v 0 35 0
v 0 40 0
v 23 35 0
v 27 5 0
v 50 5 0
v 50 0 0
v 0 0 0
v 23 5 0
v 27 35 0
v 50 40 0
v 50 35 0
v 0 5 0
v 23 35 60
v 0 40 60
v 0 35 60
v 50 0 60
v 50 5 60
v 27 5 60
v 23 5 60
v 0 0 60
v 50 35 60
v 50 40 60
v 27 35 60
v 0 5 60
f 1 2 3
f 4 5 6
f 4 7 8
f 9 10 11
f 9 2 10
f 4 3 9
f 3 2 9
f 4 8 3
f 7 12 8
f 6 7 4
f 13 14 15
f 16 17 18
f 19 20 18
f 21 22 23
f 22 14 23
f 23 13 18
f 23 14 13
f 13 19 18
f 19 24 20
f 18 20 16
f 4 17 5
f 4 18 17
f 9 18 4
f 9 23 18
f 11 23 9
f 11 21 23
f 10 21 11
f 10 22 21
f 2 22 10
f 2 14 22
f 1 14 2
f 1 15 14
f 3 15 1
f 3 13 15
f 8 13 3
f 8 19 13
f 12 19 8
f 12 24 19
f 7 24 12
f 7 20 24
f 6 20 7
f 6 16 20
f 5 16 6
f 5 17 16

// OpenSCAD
$fn = 32;

// ----------------------------------------------------------------------
// Structural section: ibeam 50 x 40 mm
// ----------------------------------------------------------------------

// --- parameters (mm) ---
sec_w = 50;               // section width, X
sec_h = 40;               // section height, Y
flange_t = 5;             // flange thickness
web_t = 4;                // web thickness
plate_t = 60;             // cut length, Z (extrusion height)

profile = [[0, 0], [50, 0], [50, 5], [27, 5], [27, 35], [50, 35], [50, 40], [0, 40], [0, 35], [23, 35], [23, 5], [0, 5]];  // primary outline, 12 points, counter clockwise

// --- the one profile operation ---
linear_extrude(height = plate_t) polygon(points = profile);
